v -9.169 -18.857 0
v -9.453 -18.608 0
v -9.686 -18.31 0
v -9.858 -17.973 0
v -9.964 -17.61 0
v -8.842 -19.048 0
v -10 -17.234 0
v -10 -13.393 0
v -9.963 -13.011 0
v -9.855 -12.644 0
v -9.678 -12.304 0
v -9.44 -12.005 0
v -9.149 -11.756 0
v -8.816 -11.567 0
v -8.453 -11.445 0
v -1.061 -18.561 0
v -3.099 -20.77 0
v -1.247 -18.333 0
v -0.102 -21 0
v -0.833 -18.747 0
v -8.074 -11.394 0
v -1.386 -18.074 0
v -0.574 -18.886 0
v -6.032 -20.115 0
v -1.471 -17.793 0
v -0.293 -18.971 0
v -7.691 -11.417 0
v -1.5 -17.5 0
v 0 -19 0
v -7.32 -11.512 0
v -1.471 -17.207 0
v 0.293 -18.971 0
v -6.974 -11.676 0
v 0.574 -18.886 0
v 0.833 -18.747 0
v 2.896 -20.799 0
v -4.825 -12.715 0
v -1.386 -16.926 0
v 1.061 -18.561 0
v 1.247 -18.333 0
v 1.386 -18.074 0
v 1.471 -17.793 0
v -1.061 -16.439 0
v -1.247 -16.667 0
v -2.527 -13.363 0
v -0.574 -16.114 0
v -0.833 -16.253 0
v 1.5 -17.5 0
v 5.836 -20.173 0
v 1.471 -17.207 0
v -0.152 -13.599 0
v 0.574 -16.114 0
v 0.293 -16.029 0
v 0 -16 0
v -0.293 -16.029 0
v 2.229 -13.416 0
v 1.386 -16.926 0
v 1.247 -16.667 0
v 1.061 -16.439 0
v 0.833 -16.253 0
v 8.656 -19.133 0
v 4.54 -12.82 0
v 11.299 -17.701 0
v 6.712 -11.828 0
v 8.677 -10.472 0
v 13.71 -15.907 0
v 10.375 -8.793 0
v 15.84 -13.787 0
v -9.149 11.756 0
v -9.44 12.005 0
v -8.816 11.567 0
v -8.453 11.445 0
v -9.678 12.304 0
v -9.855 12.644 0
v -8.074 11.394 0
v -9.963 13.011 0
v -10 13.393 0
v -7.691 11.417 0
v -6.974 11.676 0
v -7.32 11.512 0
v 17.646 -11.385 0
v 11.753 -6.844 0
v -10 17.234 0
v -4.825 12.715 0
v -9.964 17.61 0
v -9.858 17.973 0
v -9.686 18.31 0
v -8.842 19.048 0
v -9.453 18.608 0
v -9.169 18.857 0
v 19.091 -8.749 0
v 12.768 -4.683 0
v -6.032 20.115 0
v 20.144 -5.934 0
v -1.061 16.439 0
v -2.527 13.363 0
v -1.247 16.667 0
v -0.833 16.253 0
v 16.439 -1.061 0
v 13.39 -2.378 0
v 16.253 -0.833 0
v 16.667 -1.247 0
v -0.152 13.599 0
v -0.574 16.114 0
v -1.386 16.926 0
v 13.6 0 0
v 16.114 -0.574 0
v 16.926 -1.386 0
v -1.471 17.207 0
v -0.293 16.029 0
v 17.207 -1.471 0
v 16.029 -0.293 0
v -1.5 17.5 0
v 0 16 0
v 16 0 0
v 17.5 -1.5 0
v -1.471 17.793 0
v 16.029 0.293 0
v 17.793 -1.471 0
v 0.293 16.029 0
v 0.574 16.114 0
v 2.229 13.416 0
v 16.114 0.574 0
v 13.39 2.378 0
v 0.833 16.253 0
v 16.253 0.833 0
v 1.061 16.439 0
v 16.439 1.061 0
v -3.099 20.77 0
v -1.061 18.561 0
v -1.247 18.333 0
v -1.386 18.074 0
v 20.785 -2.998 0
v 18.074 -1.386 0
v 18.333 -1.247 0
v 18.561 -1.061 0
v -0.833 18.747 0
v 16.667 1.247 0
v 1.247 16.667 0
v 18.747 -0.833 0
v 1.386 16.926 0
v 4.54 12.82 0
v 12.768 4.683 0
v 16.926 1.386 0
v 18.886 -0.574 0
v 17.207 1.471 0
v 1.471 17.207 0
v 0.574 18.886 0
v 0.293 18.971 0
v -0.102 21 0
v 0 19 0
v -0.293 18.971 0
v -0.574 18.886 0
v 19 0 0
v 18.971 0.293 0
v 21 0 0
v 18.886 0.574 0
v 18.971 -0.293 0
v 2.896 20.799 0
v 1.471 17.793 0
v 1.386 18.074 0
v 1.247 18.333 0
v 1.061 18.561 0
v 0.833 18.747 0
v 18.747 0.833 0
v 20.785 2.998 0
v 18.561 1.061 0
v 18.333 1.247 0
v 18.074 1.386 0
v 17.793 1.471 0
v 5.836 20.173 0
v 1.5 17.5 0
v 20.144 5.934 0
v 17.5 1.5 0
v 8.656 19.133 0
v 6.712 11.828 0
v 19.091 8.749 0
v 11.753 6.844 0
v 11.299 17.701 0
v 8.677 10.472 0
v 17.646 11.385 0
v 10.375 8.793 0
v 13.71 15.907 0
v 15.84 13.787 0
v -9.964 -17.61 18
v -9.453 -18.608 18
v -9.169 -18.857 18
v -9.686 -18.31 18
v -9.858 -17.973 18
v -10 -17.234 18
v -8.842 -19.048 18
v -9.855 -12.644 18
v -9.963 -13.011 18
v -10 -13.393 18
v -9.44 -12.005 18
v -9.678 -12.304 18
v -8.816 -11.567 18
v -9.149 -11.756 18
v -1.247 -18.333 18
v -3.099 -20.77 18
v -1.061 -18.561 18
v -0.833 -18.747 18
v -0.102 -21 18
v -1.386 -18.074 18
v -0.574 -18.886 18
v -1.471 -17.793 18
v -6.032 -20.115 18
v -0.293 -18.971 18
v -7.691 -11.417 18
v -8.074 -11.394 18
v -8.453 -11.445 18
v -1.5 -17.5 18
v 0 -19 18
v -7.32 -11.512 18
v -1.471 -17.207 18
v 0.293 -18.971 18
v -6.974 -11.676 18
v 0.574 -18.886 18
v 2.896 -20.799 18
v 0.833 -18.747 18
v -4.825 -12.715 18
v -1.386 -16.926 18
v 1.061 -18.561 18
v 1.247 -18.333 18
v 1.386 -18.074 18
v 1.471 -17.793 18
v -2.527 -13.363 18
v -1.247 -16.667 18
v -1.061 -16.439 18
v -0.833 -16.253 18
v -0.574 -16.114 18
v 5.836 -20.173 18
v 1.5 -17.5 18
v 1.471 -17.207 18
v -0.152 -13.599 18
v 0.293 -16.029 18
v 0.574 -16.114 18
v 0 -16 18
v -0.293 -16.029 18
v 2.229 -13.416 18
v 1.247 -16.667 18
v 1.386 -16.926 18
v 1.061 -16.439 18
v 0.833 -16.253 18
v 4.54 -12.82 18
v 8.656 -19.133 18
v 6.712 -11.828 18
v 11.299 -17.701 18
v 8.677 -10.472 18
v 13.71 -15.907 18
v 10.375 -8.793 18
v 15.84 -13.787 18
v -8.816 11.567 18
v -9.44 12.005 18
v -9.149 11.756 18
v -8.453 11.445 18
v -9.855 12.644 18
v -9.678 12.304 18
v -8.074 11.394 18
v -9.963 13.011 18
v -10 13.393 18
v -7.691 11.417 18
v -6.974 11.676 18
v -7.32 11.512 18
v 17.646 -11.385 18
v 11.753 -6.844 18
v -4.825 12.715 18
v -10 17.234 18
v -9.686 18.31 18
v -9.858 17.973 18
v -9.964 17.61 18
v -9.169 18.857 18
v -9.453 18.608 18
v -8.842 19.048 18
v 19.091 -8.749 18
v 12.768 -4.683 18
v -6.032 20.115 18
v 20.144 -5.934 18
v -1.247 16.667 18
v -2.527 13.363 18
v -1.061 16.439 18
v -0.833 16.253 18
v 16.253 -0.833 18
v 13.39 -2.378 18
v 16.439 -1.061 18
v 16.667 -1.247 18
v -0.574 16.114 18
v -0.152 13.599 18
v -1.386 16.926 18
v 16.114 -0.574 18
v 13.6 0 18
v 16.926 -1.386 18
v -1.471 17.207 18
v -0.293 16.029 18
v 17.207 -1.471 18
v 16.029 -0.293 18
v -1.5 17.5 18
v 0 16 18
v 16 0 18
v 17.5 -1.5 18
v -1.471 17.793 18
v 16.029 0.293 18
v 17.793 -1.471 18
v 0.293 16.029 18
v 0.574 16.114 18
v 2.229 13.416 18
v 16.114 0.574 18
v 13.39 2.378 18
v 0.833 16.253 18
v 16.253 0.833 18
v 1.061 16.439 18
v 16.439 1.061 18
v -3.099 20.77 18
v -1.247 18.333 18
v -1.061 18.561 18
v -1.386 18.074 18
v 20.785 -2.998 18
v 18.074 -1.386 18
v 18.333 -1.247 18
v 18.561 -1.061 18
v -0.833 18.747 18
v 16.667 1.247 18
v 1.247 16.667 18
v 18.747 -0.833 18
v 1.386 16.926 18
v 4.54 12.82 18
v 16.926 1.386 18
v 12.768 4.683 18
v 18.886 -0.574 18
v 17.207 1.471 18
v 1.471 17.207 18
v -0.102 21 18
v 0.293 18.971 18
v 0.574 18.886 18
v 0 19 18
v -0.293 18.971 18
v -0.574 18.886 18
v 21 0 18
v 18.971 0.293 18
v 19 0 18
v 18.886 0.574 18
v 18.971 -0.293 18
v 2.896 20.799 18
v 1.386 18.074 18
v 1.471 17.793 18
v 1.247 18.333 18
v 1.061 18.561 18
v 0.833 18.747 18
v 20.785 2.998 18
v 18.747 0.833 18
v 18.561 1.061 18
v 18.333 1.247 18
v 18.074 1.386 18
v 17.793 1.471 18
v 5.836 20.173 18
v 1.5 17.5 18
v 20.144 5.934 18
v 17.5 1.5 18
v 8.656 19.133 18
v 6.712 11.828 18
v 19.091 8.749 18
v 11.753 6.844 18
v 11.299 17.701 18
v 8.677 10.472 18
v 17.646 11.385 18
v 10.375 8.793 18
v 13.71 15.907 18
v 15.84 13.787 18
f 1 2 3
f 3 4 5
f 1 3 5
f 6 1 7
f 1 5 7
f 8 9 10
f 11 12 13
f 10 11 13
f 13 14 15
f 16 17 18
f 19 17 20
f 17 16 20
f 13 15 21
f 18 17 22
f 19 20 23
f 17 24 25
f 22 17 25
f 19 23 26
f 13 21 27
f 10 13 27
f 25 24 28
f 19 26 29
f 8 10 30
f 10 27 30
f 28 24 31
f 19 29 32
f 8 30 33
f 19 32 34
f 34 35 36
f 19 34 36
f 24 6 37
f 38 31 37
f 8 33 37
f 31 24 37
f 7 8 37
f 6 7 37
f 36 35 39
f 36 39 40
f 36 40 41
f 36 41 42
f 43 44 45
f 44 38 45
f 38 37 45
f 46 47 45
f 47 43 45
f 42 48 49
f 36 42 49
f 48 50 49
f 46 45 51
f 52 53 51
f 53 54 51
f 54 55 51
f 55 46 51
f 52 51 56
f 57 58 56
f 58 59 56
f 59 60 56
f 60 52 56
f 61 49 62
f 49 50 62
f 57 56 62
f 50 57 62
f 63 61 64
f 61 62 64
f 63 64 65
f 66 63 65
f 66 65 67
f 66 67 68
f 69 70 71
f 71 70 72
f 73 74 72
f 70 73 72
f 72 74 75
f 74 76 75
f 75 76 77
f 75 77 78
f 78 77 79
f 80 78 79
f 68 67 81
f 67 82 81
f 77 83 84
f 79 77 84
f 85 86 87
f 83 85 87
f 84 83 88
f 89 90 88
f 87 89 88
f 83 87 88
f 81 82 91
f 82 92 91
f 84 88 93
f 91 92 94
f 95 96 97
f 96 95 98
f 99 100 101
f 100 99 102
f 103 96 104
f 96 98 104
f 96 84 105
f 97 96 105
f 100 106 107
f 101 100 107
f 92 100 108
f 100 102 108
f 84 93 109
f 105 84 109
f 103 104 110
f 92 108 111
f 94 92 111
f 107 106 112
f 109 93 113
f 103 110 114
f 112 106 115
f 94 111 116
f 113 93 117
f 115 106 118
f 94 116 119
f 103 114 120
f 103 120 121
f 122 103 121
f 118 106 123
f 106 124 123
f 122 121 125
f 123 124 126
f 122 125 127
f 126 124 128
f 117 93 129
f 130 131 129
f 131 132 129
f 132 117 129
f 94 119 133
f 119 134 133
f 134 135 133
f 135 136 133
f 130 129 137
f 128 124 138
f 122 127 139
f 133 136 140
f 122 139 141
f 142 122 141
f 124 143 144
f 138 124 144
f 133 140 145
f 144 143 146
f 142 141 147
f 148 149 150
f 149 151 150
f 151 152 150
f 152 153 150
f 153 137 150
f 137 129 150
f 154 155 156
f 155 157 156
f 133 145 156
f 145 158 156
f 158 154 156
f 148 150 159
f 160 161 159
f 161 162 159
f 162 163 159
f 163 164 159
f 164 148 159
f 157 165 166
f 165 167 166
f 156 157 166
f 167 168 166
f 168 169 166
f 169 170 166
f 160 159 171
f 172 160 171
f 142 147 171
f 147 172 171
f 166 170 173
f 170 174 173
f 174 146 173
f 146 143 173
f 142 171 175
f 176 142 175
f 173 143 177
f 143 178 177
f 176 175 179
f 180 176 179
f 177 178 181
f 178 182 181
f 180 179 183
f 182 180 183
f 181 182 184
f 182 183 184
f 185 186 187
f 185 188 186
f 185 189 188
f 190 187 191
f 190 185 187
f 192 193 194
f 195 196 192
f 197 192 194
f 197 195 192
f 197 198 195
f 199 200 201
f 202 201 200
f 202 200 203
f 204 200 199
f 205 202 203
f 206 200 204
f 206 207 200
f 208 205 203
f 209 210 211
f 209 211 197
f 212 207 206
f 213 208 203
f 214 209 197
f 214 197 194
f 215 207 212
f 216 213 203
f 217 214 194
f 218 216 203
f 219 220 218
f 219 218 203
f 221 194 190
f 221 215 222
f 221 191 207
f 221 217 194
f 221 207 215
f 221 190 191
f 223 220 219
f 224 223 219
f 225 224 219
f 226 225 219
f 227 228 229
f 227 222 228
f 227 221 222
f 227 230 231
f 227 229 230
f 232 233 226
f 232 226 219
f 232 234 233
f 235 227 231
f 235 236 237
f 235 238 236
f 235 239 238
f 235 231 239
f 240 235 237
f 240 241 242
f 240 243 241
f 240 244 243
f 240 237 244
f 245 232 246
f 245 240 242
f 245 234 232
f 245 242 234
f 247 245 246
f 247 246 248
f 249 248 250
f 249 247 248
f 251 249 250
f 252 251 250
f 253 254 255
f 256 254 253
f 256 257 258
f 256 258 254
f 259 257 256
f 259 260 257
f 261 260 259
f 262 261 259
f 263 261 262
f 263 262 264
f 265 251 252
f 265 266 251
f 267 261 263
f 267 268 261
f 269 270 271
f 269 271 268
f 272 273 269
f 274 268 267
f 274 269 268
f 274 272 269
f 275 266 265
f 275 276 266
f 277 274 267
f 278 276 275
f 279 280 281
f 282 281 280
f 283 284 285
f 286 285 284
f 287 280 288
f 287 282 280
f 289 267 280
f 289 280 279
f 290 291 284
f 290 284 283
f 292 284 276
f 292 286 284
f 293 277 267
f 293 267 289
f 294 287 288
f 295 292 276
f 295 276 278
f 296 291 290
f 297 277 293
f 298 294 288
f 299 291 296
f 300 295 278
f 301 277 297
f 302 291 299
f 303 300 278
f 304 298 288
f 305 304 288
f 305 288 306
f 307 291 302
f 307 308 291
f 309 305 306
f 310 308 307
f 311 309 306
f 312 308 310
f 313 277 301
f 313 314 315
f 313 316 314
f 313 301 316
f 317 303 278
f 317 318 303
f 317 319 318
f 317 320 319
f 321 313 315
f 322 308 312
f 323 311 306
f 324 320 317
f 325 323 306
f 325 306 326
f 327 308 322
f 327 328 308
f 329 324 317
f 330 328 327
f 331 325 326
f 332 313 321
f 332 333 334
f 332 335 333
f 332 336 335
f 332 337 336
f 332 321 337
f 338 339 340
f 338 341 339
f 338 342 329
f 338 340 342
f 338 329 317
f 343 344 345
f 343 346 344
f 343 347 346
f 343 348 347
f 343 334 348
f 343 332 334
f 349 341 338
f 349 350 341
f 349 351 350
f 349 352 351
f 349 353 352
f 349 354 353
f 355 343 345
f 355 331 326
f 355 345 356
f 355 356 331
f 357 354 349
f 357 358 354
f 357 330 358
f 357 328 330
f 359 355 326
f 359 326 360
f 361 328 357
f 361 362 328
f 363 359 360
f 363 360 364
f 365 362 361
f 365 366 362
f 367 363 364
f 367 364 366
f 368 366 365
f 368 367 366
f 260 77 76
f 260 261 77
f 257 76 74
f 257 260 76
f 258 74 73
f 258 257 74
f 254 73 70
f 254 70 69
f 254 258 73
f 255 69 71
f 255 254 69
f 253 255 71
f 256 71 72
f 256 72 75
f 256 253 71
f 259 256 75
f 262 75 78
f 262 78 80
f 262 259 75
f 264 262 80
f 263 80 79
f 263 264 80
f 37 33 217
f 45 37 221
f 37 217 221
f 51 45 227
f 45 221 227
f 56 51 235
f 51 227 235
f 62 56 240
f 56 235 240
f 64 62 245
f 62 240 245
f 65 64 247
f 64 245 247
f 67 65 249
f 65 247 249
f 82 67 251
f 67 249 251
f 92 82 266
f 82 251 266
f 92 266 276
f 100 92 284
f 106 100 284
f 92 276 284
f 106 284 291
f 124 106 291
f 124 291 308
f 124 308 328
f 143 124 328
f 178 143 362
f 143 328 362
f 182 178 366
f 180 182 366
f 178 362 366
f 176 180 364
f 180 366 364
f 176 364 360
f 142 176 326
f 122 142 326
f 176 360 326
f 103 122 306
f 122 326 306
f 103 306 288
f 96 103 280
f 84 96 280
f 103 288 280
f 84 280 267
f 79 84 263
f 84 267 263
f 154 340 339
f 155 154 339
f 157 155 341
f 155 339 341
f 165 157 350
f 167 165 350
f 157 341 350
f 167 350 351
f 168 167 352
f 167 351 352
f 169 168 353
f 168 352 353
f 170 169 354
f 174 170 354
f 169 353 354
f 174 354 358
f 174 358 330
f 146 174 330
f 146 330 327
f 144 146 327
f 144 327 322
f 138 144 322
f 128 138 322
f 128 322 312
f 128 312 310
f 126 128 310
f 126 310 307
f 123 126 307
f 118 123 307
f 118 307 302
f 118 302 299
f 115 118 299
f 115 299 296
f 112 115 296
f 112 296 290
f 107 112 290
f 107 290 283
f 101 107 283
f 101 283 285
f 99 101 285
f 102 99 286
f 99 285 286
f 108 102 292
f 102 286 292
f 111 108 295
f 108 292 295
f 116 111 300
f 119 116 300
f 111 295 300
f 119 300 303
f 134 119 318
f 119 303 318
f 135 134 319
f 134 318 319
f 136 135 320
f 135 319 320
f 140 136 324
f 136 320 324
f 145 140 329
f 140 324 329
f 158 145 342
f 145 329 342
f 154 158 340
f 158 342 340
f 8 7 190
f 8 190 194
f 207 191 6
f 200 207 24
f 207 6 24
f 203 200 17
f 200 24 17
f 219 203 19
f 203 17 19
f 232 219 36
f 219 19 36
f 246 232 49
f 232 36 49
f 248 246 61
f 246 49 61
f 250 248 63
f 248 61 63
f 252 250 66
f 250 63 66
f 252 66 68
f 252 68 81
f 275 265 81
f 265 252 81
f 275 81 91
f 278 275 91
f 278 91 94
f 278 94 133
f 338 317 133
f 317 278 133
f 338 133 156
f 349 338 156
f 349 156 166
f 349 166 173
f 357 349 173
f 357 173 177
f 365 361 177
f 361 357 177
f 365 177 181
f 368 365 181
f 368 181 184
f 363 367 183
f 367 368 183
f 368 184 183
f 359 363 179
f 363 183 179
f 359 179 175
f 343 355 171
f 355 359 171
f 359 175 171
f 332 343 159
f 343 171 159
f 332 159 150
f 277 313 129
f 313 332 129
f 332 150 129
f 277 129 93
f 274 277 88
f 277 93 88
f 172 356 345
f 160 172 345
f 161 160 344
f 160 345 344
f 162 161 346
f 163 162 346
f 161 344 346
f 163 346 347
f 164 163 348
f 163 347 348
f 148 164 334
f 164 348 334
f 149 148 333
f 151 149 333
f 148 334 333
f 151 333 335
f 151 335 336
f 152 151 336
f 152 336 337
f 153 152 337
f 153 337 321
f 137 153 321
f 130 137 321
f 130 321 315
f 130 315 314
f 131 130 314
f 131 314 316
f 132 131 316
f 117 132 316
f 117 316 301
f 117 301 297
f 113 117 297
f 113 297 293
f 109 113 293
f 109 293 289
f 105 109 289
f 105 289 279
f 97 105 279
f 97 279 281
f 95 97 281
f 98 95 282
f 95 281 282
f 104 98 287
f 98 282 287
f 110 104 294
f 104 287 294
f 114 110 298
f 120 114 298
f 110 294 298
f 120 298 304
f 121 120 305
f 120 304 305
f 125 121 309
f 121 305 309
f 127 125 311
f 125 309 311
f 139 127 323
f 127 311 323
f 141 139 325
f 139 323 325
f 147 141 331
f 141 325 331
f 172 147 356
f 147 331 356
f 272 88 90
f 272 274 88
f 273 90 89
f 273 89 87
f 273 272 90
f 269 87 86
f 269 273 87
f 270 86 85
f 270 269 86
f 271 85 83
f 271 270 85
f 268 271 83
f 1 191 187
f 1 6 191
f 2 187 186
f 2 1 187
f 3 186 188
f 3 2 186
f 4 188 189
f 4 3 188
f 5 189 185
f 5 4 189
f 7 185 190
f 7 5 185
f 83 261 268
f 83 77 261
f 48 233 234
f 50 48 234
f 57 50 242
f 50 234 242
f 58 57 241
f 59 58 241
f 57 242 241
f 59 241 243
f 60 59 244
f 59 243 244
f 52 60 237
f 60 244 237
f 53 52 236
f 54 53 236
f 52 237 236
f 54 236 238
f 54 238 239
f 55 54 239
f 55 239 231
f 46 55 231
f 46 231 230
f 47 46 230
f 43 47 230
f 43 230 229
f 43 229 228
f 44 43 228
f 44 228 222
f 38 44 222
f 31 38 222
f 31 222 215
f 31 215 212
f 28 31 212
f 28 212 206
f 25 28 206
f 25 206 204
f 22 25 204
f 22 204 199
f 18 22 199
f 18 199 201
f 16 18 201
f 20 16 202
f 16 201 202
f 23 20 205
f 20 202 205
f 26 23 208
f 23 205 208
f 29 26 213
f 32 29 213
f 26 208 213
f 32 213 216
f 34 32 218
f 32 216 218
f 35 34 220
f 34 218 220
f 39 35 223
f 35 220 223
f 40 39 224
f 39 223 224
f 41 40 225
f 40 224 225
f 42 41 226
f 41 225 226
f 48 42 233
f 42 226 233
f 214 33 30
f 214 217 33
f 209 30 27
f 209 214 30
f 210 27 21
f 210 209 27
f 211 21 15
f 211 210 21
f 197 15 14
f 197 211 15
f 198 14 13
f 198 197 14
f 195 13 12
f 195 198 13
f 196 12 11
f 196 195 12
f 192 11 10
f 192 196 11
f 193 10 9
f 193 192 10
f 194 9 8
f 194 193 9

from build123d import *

# Parameters (mm, degrees)
SKETCH_1_R          = 21
EXTRUDE_1_DEPTH     = 18
SKETCH_2_R          = 1.5
SKETCH_2_R_2        = 13.6
CUT_EXTRUDE_1_DEPTH = 25
SKETCH_4_W          = 14.155551169
SKETCH_4_H          = 37.805917944
CUT_EXTRUDE_2_DEPTH = 25
FILLET_1_R          = 2


with BuildPart() as part:
    # 草图1 → 凸台-拉伸1 (new body)
    with BuildSketch(Plane.XY):
        Circle(SKETCH_1_R)
    extrude(amount=EXTRUDE_1_DEPTH)

    # 草图2 → 切除-拉伸1 (cut)
    with BuildSketch(Plane.XY.offset(18)):
        with Locations((-17.5, 0)):
            Circle(SKETCH_2_R)
        Circle(SKETCH_2_R_2)
        with Locations((0, 17.5)):
            Circle(SKETCH_2_R)
        with Locations((17.5, 0)):
            Circle(SKETCH_2_R)
        with Locations((0, -17.5)):
            Circle(SKETCH_2_R)
    extrude(amount=-CUT_EXTRUDE_1_DEPTH, mode=Mode.SUBTRACT)

    # 草图4 → 切除-拉伸2 (cut)
    with BuildSketch(Plane(origin=(0, 0, 0), x_dir=(-1, 0, 0), z_dir=(0, 0, -1))):
        with Locations((17.077775585, -0.436773659)):
            Rectangle(SKETCH_4_W, SKETCH_4_H)
    extrude(amount=-CUT_EXTRUDE_2_DEPTH, mode=Mode.SUBTRACT)

    # 圆角1
    fillet_1_edges = [part.edges().sort_by_distance(p)[0] for p in [
        (-10, -9.217374897, 9),
        (-10, 9.217374897, 9),
        (-10, -18.466185313, 9),
        (-10, 18.466185313, 9),
    ]]
    fillet(fillet_1_edges, radius=FILLET_1_R)


solid = part.part
